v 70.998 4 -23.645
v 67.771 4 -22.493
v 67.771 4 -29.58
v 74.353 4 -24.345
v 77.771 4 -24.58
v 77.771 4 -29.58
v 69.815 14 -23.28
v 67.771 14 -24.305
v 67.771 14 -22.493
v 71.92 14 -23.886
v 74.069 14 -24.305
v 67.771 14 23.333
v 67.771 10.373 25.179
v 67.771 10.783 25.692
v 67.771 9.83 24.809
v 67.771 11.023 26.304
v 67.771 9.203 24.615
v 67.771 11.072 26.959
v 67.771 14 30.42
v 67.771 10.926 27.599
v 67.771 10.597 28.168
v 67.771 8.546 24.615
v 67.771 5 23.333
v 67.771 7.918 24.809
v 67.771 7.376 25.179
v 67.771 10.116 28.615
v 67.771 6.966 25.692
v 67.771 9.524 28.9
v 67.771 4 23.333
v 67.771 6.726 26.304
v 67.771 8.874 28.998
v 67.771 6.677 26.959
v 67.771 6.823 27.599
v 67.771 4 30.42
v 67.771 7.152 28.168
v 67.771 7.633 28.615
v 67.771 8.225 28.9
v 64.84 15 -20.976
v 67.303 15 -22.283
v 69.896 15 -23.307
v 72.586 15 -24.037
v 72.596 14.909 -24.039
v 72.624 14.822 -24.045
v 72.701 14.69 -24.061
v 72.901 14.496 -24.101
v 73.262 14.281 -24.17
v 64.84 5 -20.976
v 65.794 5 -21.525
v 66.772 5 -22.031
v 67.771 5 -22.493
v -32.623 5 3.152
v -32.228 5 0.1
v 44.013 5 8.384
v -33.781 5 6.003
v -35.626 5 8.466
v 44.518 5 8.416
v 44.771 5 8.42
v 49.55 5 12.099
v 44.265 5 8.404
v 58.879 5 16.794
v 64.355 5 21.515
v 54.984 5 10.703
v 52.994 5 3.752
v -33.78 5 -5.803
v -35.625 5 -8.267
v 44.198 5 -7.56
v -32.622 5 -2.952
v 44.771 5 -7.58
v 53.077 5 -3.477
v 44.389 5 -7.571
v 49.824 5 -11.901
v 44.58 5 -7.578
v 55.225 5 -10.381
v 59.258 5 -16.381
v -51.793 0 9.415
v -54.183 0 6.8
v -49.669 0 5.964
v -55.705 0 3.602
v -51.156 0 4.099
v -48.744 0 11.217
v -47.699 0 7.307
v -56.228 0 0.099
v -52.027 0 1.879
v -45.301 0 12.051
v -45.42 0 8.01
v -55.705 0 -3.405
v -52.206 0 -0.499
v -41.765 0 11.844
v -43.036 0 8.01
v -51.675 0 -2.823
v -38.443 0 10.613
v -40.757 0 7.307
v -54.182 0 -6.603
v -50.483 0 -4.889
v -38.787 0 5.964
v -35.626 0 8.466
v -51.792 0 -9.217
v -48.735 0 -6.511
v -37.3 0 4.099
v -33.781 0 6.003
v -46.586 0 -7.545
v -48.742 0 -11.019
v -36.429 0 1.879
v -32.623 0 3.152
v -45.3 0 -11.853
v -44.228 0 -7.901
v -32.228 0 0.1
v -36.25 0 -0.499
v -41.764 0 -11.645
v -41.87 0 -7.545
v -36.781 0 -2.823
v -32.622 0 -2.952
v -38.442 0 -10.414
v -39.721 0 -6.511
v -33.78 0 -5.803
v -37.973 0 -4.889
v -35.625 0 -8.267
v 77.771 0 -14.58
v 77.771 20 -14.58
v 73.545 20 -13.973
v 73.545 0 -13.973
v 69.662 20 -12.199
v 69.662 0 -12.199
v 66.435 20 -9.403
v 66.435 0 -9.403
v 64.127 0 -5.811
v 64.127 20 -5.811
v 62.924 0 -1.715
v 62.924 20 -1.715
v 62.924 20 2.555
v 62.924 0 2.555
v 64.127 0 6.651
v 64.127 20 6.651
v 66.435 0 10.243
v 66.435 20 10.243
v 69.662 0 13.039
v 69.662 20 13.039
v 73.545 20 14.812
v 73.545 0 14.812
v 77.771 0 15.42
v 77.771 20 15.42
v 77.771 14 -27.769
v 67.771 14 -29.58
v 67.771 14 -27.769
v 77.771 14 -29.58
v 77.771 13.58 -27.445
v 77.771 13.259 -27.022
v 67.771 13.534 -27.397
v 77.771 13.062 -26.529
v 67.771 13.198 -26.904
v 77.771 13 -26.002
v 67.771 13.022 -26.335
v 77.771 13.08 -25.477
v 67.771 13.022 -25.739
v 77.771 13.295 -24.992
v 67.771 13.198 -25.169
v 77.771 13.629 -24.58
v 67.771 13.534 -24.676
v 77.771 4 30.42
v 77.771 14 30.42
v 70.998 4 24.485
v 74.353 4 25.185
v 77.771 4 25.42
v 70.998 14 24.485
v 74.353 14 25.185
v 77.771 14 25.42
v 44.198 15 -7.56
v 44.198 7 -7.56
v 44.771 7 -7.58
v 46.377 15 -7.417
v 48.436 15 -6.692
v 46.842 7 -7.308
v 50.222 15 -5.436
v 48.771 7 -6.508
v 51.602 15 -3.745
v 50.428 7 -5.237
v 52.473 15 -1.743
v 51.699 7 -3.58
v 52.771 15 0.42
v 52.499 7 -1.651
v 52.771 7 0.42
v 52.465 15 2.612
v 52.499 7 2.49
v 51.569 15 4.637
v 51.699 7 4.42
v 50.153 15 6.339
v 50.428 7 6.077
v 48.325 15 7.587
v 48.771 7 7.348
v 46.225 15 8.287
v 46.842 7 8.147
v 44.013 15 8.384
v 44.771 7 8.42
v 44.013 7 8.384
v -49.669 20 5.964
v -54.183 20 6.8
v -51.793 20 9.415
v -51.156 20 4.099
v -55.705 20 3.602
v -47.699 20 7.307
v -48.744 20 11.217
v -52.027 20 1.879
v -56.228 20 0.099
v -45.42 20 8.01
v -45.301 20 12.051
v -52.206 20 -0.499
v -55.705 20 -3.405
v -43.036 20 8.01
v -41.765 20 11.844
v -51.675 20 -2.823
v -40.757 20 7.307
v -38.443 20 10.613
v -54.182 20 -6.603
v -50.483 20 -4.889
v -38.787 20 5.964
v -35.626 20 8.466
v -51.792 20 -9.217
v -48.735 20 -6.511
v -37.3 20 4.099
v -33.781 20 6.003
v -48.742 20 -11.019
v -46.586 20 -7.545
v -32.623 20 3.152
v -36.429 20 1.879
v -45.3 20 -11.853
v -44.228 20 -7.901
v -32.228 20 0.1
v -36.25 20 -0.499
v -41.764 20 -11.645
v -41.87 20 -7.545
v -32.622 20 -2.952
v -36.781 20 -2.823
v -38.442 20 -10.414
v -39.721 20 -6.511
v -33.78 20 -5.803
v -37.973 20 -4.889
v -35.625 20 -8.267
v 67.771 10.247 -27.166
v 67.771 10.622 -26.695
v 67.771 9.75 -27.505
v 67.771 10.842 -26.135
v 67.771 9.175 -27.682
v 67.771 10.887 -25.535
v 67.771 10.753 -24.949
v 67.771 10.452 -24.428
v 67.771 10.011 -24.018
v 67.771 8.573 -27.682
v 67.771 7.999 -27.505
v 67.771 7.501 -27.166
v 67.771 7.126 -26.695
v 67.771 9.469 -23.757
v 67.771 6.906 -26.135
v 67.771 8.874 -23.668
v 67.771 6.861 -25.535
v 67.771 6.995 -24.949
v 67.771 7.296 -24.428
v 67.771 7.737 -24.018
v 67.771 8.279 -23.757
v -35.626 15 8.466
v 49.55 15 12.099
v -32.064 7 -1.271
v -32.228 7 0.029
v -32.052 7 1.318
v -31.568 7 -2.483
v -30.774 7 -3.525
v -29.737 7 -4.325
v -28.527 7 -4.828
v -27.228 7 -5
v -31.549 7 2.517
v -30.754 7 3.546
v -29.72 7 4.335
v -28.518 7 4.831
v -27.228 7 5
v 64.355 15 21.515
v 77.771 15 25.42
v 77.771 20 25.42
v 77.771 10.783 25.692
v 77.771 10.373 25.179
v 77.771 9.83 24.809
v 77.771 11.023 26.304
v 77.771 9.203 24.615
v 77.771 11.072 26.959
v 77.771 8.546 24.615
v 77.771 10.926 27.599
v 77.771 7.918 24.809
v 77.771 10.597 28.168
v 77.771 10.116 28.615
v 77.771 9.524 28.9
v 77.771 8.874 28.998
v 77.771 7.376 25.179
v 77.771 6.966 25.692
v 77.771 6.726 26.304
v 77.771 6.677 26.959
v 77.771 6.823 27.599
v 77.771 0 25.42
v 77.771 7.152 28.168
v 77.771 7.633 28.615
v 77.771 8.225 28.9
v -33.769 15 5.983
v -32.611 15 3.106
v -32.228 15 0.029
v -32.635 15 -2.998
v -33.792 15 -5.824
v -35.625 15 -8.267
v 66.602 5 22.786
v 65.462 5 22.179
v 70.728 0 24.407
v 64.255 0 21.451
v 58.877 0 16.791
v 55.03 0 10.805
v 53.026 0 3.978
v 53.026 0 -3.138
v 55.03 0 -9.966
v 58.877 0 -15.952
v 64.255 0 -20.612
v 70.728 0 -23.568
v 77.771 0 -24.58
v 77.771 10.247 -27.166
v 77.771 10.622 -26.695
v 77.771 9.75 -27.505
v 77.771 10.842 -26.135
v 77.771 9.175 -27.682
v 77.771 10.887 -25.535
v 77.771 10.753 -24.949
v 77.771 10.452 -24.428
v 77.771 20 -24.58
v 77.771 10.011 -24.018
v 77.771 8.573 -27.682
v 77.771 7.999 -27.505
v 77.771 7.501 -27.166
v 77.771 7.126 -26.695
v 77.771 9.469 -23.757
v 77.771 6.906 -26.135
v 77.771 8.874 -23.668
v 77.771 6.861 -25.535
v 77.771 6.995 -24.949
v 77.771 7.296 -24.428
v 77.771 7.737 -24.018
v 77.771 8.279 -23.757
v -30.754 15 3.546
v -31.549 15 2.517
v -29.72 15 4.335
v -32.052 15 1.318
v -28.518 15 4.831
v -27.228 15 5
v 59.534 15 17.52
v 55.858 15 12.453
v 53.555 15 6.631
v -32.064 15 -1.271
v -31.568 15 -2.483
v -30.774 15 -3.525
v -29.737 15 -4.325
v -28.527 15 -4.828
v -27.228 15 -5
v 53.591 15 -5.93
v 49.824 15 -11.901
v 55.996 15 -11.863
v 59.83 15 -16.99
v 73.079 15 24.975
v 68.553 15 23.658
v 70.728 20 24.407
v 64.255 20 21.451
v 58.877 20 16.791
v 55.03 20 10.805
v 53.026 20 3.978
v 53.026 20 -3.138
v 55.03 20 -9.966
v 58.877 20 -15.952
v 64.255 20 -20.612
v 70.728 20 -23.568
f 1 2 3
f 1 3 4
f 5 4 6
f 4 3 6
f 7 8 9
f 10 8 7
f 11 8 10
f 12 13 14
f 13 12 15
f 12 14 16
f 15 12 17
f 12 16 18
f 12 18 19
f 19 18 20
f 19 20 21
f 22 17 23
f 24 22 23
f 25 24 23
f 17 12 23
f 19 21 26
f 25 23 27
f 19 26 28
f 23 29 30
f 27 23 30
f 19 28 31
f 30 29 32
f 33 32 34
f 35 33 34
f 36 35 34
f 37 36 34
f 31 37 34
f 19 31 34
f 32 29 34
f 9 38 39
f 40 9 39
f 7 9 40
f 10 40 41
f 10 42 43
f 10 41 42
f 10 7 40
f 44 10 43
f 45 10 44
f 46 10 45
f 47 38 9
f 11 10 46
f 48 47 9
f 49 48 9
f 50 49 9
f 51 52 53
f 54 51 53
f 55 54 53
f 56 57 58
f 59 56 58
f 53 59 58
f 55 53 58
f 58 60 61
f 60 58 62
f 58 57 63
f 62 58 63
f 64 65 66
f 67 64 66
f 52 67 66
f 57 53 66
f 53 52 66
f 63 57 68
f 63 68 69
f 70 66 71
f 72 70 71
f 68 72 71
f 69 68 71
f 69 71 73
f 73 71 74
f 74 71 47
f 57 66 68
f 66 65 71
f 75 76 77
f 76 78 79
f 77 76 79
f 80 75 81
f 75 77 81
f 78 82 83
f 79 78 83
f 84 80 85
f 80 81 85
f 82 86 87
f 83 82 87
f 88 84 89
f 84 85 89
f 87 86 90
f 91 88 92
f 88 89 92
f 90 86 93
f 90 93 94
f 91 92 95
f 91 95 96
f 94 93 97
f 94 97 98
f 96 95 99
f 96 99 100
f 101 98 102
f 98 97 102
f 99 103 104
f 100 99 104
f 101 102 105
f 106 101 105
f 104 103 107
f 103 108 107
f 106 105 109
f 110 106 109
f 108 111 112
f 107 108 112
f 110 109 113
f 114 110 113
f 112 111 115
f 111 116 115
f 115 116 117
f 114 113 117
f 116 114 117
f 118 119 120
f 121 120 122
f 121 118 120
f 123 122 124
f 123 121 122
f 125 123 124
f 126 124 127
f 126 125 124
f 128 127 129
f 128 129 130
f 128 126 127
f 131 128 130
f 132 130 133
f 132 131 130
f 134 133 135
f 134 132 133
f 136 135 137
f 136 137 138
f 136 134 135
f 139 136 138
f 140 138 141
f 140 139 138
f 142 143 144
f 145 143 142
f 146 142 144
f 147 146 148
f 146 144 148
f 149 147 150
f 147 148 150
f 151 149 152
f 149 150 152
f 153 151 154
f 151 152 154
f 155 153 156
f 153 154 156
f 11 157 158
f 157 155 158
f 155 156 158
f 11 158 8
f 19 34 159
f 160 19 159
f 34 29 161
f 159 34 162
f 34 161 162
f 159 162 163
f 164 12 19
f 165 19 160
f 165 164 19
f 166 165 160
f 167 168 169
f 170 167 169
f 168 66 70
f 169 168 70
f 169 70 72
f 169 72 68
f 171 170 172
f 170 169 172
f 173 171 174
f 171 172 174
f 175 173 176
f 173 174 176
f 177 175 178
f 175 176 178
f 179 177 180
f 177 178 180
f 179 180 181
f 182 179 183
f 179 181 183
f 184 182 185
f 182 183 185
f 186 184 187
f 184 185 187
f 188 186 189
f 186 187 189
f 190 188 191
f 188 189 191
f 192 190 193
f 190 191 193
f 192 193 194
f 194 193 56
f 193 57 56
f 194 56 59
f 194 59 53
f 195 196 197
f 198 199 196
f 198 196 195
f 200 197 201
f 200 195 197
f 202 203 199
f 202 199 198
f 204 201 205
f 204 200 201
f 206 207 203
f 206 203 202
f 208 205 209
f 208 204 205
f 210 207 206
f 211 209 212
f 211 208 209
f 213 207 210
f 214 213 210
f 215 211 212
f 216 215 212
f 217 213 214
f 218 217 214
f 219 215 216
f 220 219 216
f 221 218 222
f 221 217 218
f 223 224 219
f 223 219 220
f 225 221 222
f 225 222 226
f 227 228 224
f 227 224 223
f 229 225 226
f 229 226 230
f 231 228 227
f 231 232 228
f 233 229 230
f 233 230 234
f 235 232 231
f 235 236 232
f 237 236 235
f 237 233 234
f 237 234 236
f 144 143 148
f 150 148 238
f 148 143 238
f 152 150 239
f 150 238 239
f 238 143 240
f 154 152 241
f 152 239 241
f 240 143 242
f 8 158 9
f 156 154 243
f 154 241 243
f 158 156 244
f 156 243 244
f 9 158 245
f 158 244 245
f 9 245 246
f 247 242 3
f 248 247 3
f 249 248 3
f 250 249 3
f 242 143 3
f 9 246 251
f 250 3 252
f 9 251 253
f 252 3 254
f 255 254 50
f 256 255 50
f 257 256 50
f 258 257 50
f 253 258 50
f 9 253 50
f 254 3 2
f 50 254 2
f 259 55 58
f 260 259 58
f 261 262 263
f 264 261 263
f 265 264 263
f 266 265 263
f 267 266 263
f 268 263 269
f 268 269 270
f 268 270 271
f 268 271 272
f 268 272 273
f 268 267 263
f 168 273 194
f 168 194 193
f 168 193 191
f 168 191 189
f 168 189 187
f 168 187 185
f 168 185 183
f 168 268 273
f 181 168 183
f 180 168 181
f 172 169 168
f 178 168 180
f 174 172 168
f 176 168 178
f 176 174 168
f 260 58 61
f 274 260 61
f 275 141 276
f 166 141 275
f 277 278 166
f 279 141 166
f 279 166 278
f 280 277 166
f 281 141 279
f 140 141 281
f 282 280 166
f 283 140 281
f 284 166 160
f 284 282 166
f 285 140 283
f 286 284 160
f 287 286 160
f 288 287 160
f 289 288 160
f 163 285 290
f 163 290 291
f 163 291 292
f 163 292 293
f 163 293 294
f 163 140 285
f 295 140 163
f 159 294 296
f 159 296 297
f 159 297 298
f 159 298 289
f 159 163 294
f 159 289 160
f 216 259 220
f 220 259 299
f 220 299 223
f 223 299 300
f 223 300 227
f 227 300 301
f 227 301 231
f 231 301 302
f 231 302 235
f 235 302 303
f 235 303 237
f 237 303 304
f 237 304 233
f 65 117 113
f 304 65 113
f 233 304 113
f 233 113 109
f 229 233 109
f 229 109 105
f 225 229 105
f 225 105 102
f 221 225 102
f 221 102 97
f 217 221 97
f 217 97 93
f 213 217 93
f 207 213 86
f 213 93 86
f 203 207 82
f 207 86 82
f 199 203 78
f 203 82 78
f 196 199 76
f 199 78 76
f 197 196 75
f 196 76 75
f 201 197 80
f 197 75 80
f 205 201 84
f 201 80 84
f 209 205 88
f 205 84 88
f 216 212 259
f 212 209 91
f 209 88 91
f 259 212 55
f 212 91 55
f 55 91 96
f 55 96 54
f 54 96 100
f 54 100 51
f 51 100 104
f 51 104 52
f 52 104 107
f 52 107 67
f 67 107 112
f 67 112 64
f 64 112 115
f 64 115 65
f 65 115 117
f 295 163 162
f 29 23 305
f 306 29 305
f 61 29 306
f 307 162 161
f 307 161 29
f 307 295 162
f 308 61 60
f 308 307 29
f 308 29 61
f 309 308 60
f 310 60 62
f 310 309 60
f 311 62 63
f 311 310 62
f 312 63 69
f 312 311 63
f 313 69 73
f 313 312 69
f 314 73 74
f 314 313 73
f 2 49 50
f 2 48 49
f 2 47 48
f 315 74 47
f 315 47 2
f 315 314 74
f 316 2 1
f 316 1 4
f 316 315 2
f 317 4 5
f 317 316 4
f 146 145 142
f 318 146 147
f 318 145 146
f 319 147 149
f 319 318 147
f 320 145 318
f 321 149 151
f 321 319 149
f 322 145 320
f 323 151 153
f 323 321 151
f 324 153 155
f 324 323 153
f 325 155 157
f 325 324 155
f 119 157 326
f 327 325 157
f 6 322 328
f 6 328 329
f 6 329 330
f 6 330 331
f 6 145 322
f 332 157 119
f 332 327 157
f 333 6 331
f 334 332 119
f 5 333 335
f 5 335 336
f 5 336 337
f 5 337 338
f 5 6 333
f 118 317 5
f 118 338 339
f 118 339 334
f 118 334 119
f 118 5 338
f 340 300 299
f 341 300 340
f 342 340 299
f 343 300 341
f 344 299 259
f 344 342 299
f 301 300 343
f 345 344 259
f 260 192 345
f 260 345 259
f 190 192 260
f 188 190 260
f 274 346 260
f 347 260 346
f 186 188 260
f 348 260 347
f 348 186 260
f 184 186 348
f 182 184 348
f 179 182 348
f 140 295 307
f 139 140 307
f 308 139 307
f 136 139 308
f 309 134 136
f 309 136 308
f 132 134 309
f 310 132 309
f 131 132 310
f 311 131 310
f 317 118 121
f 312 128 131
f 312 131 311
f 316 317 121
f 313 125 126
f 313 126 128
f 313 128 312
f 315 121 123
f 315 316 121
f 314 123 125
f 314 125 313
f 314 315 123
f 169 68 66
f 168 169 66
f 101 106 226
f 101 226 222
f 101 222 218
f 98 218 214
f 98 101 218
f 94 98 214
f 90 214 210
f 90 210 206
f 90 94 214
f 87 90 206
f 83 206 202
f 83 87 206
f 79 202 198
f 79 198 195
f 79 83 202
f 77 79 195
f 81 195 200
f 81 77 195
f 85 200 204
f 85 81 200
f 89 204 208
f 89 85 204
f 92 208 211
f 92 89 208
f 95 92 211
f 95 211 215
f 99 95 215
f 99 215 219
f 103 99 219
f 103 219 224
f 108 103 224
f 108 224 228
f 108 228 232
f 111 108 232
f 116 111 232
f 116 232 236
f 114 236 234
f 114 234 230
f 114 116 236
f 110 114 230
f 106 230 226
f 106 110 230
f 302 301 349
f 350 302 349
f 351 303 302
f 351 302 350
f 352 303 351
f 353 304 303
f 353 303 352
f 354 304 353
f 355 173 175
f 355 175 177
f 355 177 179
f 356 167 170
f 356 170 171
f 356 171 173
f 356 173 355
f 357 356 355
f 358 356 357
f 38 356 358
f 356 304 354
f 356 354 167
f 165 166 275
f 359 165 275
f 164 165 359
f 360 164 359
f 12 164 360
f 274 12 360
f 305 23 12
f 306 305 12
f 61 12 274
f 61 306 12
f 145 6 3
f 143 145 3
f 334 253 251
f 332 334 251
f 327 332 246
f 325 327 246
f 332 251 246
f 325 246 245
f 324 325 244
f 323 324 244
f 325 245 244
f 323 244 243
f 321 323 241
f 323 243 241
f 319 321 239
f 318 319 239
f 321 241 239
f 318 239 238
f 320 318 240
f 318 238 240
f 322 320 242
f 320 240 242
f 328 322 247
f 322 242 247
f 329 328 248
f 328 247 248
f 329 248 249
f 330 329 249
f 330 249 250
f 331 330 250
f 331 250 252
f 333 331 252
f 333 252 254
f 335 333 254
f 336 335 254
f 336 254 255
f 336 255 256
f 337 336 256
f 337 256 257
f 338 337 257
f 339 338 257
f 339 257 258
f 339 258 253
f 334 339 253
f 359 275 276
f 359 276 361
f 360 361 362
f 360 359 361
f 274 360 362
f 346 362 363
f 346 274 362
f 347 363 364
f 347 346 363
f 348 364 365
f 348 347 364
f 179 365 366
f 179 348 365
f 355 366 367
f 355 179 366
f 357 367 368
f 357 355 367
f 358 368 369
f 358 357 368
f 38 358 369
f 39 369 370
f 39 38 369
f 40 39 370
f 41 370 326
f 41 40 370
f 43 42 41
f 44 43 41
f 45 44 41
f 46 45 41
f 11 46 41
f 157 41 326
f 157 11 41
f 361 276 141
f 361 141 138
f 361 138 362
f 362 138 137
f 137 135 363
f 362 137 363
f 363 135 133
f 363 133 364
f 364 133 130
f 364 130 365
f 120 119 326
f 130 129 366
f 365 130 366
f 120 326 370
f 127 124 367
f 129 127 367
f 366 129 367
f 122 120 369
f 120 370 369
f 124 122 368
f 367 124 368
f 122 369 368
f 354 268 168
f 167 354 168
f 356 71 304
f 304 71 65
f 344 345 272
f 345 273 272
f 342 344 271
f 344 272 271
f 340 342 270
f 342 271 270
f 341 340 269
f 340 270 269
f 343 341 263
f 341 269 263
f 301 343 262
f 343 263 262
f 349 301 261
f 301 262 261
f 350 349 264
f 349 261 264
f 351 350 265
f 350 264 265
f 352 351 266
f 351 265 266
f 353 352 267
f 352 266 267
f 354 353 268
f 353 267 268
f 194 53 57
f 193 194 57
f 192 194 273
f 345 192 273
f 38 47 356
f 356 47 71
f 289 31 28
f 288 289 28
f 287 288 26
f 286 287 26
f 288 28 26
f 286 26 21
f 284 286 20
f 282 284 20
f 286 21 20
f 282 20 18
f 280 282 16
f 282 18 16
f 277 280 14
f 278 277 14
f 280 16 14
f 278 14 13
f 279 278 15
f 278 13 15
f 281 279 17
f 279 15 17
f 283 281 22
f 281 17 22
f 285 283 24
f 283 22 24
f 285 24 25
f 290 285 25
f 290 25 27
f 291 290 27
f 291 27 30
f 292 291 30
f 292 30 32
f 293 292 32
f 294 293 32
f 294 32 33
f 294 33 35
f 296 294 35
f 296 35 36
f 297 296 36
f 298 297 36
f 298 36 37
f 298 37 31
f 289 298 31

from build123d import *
from build123d.topology import SkipClean

# Parameters (mm, degrees)
EXTRUDE_START       = 5
EXTRUDE_2_DEPTH     = 10
EXTRUDE_4_DEPTH     = 2
EXTRUDE_START_2     = -11
EXTRUDE_5_DEPTH     = 10
EXTRUDE_6_DEPTH     = 20
SKETCH_1_10_R       = 12
EXTRUDE_7_DEPTH     = 10
SKETCH_1_11_R       = 12
EXTRUDE_8_DEPTH     = 20
SKETCH_1_12_R       = 8
CUT_EXTRUDE_1_DEPTH = 20
SKETCH_5_R          = 2
CUT_EXTRUDE_2_DEPTH = 20
EXTRUDE_9_DEPTH     = 20
SKETCH_6_R          = 2.01846984
SKETCH_6_R_2        = 2.203549483
CUT_EXTRUDE_3_DEPTH = 20


with BuildPart() as part:
    # 스케치1 → 보스-돌출2 (new body)
    with BuildSketch(Plane(origin=(0, 0, 0), x_dir=(1, 0, 0), z_dir=(0, 1, 0)).offset(EXTRUDE_START)):
        with BuildLine():
            Line((49.549845173, -12.099230676), (64.355035733, -21.515007377))
            ThreePointArc((64.355035733, -21.515007377), (70.784736297, -24.42375035), (77.771133503, -25.41978705))
            Line((77.771133503, -25.41978705), (77.771133503, -15.41978705))
            ThreePointArc((77.771133503, -15.41978705), (62.771133503, -0.41978705), (77.771133503, 14.58021295))
            Line((77.771133503, 14.58021295), (77.771133503, 24.58021295))
            ThreePointArc((77.771133503, 24.58021295), (71.05915641, 23.662350801), (64.840032894, 20.97616203))
            Line((64.840032894, 20.97616203), (49.823782841, 11.900769324))
            Line((49.823782841, 11.900769324), (-44.228051971, 7.900769324))
            ThreePointArc((-44.228051971, 7.900769324), (-36.228051971, -0.099230676), (-44.228051971, -8.099230676))
            Line((-44.228051971, -8.099230676), (49.549845173, -12.099230676))
        make_face()
        with BuildLine():
            ThreePointArc((44.198484097, 7.559691169), (52.770591505, -0.512908915), (44.012885893, -8.383772269))
            Line((44.012885893, -8.383772269), (-27.228341583, -5))
            ThreePointArc((-27.228341583, -5), (-32.228341583, 0), (-27.228341583, 5))
            Line((-27.228341583, 5), (44.198484097, 7.559691169))
        make_face(mode=Mode.SUBTRACT)
    extrude(amount=EXTRUDE_2_DEPTH)

    # 스케치1<8> → 보스-돌출4 (add)
    with BuildSketch(Plane(origin=(0, 0, 0), x_dir=(1, 0, 0), z_dir=(0, 1, 0)).offset(EXTRUDE_START)):
        with BuildLine():
            Line((44.198484097, 7.559691169), (-27.228341583, 5))
            ThreePointArc((-27.228341583, 5), (-30.774179158, 3.525200121), (-32.228256402, -0.029185644))
            ThreePointArc((-32.228256402, -0.029185644), (-30.753541703, -3.545837575), (-27.228341583, -5))
            Line((-27.228341583, -5), (44.012885893, -8.383772269))
            Line((44.012885893, -8.383772269), (44.771133503, -8.41978705))
            ThreePointArc((44.771133503, -8.41978705), (50.42798774, -6.076641312), (52.771133503, -0.419787086))
            ThreePointArc((52.771133503, -0.419787086), (50.427987765, 5.237067187), (44.771133503, 7.58021295))
            Line((44.771133503, 7.58021295), (44.198484097, 7.559691169))
        make_face()
    extrude(amount=EXTRUDE_4_DEPTH)

    # 스케치2 → 보스-돌출5 (add)
    with BuildSketch(Plane(origin=(0, 15, 0), x_dir=(1, 0, 0), z_dir=(0, 1, 0)).offset(EXTRUDE_START_2)):
        with BuildLine():
            Line((67.771133503, -30.41978705), (77.771133503, -30.41978705))
            Line((77.771133503, -30.41978705), (77.771133503, -25.41978705))
            ThreePointArc((77.771133503, -25.41978705), (72.663392411, -24.892444873), (67.771133503, -23.332665525))
            Line((67.771133503, -23.332665525), (67.771133503, -30.41978705))
        make_face()
        with BuildLine():
            Line((67.771133503, 29.58021295), (67.771133503, 22.493091425))
            ThreePointArc((67.771133503, 22.493091425), (72.663392411, 24.052870773), (77.771133503, 24.58021295))
            Line((77.771133503, 24.58021295), (77.771133503, 29.58021295))
            Line((77.771133503, 29.58021295), (67.771133503, 29.58021295))
        make_face()
    extrude(amount=EXTRUDE_5_DEPTH)

    # 스케치1<9> → 보스-돌출6 (add)
    with BuildSketch(Plane(origin=(0, 0, 0), x_dir=(1, 0, 0), z_dir=(0, 1, 0))):
        with BuildLine():
            Line((-44.228051971, 7.900769324), (-35.625030381, 8.266653588))
            ThreePointArc((-35.625030381, 8.266653588), (-56.22805195, -0.098514915), (-35.626028438, -8.466141165))
            Line((-35.626028438, -8.466141165), (-44.228051971, -8.099230676))
            ThreePointArc((-44.228051971, -8.099230676), (-52.228051971, -0.099230676), (-44.228051971, 7.900769324))
        make_face()
    extrude(amount=EXTRUDE_6_DEPTH)

    # 스케치1<10> → 보스-돌출7 (add)
    with BuildSketch(Plane(origin=(0, 0, 0), x_dir=(1, 0, 0), z_dir=(0, 1, 0))):
        with Locations(Location((-44.228051971, -0.099230676, 0), (0, 0, 44.199354179))):
            Circle(SKETCH_1_10_R)
    extrude(amount=EXTRUDE_7_DEPTH)

    # 스케치1<11> → 보스-돌출8 (add)
    with SkipClean():  # the faces are left unmerged after this step: merging them gives an invalid solid
        with BuildSketch(Plane(origin=(0, 0, 0), x_dir=(1, 0, 0), z_dir=(0, 1, 0))):
            with Locations(Location((-44.228051971, -0.099230676, 0), (0, 0, 270))):
                Circle(SKETCH_1_11_R)
        extrude(amount=EXTRUDE_8_DEPTH)
    add(part.part.scale(1), mode=Mode.REPLACE)  # the faces are merged on a copy

    # 스케치1<12> → 컷-돌출1 (cut)
    with BuildSketch(Plane(origin=(0, 0, 0), x_dir=(1, 0, 0), z_dir=(0, 1, 0))):
        with Locations(Location((-44.228051971, -0.099230676, 0), (0, 0, 90))):
            Circle(SKETCH_1_12_R)
    extrude(amount=CUT_EXTRUDE_1_DEPTH, mode=Mode.SUBTRACT)

    # 스케치5 → 컷-돌출2 (cut)
    with BuildSketch(Plane.ZY.offset(-67.771133503)):
        with Locations((-26.036652187, 15)):
            Circle(SKETCH_5_R)
    extrude(amount=-CUT_EXTRUDE_2_DEPTH, mode=Mode.SUBTRACT)

    # 스케치1<13> → 보스-돌출9 (add)
    with SkipClean():  # the faces are left unmerged after this step: merging them gives an invalid solid
        with BuildSketch(Plane(origin=(0, 0, 0), x_dir=(1, 0, 0), z_dir=(0, 1, 0))):
            with BuildLine():
                Line((77.771133503, 24.58021295), (77.771133503, 14.58021295))
                ThreePointArc((77.771133503, 14.58021295), (62.771133503, -0.41978705), (77.771133503, -15.41978705))
                Line((77.771133503, -15.41978705), (77.771133503, -25.41978705))
                ThreePointArc((77.771133503, -25.41978705), (52.771133503, -0.41978705), (77.771133503, 24.58021295))
            make_face()
        extrude(amount=EXTRUDE_9_DEPTH)
    add(part.part.scale(1), mode=Mode.REPLACE)  # the faces are merged on a copy

    # 스케치6 → 컷-돌출3 (cut)
    with BuildSketch(Plane.ZY.offset(-67.771133503)):
        with Locations((-25.686179168, 8.874314897)):
            Circle(SKETCH_6_R)
        with Locations((26.79403668, 8.874314897)):
            Circle(SKETCH_6_R_2)
    extrude(amount=-CUT_EXTRUDE_3_DEPTH, mode=Mode.SUBTRACT)


solid = part.part
